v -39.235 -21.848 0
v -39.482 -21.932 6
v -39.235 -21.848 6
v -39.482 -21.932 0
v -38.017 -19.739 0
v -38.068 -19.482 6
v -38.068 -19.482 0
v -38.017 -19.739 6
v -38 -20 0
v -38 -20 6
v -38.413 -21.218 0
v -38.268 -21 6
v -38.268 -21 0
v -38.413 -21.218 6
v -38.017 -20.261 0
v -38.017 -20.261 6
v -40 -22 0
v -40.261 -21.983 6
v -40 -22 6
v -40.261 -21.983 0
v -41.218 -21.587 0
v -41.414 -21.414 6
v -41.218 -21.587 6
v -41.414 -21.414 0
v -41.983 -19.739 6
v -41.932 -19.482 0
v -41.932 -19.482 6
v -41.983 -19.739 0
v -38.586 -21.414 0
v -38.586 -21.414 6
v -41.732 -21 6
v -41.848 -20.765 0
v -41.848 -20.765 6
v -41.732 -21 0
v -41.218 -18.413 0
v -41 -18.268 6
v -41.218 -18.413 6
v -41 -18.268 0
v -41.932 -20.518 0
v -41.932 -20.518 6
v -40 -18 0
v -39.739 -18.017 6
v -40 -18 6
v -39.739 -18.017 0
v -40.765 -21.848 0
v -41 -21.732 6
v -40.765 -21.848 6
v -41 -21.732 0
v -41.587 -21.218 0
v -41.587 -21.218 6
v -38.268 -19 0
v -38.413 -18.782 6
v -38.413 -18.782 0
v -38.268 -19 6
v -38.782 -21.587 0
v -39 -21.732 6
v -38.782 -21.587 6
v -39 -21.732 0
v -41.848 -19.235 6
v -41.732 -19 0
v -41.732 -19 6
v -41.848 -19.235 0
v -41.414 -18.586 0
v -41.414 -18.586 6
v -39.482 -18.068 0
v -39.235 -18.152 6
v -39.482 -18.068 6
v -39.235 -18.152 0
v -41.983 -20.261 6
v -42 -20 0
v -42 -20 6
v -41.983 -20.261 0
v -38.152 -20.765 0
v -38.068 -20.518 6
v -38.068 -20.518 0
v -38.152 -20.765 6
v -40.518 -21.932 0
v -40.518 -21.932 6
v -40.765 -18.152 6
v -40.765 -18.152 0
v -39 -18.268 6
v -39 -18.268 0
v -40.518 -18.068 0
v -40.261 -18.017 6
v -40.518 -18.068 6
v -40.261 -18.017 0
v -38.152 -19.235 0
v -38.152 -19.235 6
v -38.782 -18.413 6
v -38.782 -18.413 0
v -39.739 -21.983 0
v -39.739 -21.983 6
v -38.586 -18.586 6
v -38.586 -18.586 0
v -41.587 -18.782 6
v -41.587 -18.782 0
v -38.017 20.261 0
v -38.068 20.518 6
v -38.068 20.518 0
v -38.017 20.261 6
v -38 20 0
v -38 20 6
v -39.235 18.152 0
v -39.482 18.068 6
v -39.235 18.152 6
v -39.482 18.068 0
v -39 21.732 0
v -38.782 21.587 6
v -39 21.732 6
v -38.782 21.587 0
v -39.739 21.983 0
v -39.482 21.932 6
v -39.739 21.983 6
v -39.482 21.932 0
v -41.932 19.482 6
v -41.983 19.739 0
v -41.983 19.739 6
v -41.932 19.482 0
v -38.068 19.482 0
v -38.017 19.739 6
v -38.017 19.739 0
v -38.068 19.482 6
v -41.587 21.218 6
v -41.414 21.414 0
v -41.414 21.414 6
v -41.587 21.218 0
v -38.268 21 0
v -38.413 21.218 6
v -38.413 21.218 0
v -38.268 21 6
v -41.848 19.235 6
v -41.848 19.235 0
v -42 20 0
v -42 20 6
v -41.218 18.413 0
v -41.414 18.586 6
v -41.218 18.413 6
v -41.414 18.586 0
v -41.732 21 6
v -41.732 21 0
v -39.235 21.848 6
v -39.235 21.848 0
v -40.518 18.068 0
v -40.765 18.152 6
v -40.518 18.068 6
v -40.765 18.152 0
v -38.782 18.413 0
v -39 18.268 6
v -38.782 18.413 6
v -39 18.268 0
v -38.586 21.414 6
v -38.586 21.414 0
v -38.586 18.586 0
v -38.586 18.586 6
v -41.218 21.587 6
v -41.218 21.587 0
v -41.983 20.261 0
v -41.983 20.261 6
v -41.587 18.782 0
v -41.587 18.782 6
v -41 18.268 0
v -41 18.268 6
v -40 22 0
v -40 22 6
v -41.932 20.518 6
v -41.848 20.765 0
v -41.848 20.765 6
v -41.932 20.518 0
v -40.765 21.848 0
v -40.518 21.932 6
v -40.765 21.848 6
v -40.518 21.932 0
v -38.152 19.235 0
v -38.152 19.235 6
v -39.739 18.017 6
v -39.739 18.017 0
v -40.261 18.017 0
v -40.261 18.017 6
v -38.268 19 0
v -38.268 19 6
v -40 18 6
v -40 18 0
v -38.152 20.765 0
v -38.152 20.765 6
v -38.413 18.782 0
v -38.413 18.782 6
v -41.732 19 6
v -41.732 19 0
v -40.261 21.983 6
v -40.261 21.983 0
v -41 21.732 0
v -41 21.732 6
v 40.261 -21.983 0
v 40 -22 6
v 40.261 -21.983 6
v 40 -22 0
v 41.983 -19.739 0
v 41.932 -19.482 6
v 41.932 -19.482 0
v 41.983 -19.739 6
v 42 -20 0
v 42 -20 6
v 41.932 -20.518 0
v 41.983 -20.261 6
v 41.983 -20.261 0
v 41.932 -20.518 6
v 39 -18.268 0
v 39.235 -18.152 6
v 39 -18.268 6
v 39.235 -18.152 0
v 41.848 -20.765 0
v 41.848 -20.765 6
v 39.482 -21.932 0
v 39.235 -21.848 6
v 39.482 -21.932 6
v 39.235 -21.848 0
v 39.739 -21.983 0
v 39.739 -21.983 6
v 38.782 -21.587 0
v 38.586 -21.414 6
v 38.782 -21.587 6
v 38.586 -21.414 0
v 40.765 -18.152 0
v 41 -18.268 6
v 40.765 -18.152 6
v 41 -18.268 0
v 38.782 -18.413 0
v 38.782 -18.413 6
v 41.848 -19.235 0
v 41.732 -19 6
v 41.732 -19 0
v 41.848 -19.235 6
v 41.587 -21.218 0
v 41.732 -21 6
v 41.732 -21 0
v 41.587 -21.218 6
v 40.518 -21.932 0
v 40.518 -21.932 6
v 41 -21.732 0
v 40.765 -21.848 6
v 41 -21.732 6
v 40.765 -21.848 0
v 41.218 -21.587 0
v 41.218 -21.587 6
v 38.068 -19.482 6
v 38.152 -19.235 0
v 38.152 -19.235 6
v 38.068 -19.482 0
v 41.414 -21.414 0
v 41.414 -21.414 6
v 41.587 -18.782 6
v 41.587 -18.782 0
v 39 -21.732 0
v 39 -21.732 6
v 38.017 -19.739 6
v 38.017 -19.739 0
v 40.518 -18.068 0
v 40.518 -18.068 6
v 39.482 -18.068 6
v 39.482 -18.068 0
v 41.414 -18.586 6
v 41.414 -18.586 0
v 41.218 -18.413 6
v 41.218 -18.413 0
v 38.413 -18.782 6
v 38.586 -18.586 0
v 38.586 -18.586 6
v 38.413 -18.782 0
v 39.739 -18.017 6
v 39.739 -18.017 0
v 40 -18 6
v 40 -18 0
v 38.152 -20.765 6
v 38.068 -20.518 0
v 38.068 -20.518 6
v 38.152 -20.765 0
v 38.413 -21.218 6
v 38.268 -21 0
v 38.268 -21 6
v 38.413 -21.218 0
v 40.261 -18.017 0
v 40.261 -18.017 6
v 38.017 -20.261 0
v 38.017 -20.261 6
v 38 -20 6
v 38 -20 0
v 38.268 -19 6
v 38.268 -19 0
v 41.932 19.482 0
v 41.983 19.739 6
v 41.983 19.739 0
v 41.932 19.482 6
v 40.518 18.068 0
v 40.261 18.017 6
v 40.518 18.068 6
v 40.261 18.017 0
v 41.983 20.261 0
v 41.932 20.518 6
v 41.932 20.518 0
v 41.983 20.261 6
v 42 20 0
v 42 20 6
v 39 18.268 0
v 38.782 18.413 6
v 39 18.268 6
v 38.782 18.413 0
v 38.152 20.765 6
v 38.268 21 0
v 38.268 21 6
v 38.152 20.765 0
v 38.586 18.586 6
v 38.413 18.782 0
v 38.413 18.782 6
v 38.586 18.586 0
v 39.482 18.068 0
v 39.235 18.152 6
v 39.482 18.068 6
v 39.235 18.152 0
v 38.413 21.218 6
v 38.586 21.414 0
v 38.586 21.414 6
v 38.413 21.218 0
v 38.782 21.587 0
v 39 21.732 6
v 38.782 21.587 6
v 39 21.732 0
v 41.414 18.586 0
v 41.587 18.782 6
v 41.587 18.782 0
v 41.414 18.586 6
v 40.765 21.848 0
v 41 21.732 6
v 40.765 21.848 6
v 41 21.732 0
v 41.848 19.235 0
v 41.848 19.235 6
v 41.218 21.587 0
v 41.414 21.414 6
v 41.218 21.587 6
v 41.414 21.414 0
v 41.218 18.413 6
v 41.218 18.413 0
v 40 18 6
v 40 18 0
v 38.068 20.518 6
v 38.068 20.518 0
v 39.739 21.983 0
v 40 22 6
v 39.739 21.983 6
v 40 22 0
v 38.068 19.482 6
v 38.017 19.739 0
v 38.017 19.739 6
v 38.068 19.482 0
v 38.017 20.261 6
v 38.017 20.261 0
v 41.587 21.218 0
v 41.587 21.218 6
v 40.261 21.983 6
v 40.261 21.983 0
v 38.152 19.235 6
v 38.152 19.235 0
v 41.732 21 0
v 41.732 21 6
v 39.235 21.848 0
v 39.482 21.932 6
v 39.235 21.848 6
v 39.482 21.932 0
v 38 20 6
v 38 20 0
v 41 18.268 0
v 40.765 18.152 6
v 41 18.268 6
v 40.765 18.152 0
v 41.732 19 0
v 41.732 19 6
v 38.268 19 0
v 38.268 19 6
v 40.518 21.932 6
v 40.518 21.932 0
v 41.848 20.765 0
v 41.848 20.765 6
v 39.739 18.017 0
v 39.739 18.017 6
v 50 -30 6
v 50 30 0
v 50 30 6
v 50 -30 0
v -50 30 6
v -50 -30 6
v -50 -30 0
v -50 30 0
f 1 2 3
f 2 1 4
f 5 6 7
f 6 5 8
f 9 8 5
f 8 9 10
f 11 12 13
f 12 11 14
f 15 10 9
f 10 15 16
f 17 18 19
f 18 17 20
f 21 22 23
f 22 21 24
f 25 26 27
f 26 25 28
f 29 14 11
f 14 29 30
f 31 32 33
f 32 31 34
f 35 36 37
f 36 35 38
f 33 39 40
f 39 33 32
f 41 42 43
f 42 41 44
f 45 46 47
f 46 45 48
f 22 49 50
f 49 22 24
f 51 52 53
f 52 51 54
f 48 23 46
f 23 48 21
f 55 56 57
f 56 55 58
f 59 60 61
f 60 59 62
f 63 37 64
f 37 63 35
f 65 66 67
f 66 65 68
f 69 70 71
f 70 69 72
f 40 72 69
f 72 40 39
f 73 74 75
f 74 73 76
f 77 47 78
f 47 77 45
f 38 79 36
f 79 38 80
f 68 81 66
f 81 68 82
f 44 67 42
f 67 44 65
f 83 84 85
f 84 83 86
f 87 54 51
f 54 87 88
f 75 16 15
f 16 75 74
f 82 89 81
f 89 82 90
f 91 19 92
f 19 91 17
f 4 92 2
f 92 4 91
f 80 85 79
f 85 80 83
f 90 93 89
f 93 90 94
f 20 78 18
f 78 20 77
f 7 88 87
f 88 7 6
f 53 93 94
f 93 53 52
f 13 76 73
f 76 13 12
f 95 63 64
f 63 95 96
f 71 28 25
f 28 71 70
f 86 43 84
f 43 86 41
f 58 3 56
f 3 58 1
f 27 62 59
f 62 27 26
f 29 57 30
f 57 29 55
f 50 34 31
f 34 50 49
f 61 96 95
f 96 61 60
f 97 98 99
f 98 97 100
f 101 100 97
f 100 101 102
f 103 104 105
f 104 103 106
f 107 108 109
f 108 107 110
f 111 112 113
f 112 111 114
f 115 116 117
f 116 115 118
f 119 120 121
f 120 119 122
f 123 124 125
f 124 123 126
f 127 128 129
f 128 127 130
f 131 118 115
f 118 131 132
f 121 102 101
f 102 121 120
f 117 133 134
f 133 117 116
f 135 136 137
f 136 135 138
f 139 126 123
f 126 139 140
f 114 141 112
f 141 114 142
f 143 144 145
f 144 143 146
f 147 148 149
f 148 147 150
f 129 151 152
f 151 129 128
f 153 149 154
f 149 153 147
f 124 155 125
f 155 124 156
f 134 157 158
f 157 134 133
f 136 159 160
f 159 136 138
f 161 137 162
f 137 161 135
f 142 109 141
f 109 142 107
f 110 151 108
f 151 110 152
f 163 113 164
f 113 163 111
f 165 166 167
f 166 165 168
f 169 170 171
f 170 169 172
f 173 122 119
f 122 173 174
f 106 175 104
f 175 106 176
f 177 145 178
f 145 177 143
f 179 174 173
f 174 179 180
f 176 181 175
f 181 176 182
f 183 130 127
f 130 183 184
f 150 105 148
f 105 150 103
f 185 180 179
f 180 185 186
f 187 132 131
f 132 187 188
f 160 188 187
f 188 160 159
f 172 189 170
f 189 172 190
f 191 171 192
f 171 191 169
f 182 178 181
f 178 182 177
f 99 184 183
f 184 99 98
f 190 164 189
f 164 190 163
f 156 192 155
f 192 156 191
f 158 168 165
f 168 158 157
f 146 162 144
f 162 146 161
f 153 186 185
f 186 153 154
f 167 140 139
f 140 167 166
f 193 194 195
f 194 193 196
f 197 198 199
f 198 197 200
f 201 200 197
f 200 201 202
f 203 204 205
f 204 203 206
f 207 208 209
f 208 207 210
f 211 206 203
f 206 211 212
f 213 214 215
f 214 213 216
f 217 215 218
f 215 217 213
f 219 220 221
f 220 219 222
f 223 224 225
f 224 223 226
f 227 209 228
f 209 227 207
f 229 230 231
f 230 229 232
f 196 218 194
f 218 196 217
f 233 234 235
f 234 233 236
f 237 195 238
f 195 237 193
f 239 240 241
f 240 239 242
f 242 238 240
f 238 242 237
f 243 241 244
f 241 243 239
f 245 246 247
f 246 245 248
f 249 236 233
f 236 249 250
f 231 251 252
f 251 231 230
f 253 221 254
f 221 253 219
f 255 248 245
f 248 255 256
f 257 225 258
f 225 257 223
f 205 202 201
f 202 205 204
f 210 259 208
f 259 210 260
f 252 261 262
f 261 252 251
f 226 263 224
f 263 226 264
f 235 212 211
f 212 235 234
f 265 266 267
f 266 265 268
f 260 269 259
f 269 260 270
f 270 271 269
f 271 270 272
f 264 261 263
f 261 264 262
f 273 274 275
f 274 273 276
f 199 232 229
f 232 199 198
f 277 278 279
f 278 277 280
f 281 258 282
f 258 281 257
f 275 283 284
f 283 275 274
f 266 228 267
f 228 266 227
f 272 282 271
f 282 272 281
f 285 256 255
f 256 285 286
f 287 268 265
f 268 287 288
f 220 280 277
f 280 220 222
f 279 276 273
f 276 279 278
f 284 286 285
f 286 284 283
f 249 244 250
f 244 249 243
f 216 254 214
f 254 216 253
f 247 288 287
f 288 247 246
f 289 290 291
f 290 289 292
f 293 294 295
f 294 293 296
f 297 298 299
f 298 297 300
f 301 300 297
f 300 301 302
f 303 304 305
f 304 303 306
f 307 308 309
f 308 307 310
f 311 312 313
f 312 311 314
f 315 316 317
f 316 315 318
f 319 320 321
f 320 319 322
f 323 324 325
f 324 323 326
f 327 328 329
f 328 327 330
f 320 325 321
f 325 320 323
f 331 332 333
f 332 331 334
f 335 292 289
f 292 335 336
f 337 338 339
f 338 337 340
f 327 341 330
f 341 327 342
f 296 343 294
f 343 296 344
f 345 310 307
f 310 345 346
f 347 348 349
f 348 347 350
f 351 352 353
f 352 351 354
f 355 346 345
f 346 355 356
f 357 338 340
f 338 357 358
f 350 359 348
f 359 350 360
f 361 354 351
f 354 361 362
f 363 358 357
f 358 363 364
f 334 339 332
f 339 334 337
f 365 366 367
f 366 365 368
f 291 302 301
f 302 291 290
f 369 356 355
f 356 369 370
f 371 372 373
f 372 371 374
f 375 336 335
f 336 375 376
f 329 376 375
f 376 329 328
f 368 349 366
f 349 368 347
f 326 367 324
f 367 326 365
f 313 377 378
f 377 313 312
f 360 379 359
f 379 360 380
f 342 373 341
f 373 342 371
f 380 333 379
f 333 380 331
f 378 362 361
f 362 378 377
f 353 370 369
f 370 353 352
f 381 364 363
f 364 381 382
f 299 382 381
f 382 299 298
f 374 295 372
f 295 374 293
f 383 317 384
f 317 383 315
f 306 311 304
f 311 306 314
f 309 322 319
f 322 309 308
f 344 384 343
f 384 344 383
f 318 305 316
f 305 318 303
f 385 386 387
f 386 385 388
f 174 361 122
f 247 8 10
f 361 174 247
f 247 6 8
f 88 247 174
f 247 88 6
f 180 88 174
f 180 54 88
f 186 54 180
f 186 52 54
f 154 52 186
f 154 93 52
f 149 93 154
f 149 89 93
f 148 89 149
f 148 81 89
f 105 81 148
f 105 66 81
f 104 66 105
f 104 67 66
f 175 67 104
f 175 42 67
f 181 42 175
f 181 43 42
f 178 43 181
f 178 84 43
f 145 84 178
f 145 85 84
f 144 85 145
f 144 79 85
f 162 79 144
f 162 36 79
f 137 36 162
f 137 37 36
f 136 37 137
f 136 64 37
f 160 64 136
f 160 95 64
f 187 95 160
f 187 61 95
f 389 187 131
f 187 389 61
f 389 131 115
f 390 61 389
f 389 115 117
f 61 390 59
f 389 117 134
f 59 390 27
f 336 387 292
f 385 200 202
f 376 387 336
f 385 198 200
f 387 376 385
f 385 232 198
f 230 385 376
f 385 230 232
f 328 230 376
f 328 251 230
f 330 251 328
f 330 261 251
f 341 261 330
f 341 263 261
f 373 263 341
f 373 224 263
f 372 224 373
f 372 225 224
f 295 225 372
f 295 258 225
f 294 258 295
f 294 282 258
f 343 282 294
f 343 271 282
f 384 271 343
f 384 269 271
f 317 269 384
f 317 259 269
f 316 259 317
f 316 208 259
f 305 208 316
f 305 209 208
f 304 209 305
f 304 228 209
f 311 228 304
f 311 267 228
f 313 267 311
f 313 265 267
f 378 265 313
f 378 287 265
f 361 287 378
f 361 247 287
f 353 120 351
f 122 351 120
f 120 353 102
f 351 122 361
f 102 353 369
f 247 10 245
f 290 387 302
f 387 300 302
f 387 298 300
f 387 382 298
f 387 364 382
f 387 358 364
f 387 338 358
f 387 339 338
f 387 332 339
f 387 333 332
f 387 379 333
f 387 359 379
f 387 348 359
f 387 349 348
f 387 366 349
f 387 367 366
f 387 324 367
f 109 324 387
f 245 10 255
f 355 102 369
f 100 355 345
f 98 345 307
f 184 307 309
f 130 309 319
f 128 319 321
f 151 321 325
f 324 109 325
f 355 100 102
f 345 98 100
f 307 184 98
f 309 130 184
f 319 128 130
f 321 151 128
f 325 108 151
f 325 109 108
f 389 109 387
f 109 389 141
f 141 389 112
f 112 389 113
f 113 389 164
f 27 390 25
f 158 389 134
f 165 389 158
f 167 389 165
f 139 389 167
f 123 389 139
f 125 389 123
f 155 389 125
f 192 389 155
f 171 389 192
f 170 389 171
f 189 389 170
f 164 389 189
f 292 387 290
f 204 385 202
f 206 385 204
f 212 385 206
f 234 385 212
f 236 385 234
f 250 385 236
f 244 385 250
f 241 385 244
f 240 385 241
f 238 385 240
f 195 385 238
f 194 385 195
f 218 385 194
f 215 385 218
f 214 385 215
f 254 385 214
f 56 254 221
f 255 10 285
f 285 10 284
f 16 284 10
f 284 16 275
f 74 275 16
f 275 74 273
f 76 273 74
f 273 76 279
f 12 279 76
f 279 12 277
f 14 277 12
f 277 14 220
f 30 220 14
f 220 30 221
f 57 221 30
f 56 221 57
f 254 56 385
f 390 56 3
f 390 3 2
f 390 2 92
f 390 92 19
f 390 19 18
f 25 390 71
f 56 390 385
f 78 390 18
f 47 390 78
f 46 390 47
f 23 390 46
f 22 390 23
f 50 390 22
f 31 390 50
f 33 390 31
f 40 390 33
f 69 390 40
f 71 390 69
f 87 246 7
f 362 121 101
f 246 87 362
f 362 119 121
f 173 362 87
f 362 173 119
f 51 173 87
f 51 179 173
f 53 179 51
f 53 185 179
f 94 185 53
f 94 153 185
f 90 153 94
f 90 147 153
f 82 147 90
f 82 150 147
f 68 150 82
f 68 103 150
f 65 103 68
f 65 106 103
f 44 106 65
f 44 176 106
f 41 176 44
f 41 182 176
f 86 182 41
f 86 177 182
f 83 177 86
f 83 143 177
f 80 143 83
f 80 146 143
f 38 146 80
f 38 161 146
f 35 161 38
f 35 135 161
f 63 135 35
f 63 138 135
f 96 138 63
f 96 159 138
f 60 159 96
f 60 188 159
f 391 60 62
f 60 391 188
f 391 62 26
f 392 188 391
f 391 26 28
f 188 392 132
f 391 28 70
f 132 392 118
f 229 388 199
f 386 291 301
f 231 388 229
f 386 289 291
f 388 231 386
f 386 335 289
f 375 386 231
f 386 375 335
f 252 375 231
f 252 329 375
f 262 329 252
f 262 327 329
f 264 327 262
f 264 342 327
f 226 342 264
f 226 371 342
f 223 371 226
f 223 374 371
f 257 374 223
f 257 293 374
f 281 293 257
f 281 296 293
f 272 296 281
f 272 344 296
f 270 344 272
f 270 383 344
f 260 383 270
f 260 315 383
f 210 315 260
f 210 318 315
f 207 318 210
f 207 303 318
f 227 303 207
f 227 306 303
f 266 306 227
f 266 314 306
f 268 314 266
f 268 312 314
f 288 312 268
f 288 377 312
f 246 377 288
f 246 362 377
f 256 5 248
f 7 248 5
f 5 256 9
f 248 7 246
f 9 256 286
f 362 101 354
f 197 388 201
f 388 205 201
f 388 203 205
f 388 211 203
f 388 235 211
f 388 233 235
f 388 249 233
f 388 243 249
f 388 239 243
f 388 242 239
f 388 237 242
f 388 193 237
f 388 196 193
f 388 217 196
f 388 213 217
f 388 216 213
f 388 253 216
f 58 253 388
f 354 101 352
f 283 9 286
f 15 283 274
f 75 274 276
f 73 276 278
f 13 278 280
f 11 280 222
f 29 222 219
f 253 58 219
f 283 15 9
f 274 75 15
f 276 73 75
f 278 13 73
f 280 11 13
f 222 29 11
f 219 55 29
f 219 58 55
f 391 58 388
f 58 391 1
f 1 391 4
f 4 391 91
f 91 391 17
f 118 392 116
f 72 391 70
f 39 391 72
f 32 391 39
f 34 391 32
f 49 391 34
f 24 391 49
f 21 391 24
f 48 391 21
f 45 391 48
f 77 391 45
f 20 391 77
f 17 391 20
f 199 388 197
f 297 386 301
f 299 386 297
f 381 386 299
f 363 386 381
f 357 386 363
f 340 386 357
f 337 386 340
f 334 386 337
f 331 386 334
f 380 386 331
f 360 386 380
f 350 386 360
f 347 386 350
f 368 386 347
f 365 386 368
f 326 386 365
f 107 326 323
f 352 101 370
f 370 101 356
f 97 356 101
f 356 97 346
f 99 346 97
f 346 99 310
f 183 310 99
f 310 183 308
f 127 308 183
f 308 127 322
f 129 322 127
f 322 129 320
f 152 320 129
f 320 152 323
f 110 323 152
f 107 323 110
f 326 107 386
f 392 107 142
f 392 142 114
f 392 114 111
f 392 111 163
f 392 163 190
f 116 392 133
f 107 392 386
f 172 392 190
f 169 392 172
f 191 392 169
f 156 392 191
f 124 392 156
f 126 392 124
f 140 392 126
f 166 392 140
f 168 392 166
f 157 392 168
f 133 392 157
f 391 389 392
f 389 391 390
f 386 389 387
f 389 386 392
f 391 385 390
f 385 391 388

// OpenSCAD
// Starter plate for task-002.
$fn = 48;

plate_width = 100;
plate_depth = 60;
plate_thickness = 6;
hole_diameter = 4;
edge_offset = 10;

difference() {
  translate([-plate_width / 2, -plate_depth / 2, 0])
    cube([plate_width, plate_depth, plate_thickness]);

  for (x = [-plate_width / 2 + edge_offset, plate_width / 2 - edge_offset])
    for (y = [-plate_depth / 2 + edge_offset, plate_depth / 2 - edge_offset])
      translate([x, y, -1])
        cylinder(h = plate_thickness + 2, r = hole_diameter / 2);
}
